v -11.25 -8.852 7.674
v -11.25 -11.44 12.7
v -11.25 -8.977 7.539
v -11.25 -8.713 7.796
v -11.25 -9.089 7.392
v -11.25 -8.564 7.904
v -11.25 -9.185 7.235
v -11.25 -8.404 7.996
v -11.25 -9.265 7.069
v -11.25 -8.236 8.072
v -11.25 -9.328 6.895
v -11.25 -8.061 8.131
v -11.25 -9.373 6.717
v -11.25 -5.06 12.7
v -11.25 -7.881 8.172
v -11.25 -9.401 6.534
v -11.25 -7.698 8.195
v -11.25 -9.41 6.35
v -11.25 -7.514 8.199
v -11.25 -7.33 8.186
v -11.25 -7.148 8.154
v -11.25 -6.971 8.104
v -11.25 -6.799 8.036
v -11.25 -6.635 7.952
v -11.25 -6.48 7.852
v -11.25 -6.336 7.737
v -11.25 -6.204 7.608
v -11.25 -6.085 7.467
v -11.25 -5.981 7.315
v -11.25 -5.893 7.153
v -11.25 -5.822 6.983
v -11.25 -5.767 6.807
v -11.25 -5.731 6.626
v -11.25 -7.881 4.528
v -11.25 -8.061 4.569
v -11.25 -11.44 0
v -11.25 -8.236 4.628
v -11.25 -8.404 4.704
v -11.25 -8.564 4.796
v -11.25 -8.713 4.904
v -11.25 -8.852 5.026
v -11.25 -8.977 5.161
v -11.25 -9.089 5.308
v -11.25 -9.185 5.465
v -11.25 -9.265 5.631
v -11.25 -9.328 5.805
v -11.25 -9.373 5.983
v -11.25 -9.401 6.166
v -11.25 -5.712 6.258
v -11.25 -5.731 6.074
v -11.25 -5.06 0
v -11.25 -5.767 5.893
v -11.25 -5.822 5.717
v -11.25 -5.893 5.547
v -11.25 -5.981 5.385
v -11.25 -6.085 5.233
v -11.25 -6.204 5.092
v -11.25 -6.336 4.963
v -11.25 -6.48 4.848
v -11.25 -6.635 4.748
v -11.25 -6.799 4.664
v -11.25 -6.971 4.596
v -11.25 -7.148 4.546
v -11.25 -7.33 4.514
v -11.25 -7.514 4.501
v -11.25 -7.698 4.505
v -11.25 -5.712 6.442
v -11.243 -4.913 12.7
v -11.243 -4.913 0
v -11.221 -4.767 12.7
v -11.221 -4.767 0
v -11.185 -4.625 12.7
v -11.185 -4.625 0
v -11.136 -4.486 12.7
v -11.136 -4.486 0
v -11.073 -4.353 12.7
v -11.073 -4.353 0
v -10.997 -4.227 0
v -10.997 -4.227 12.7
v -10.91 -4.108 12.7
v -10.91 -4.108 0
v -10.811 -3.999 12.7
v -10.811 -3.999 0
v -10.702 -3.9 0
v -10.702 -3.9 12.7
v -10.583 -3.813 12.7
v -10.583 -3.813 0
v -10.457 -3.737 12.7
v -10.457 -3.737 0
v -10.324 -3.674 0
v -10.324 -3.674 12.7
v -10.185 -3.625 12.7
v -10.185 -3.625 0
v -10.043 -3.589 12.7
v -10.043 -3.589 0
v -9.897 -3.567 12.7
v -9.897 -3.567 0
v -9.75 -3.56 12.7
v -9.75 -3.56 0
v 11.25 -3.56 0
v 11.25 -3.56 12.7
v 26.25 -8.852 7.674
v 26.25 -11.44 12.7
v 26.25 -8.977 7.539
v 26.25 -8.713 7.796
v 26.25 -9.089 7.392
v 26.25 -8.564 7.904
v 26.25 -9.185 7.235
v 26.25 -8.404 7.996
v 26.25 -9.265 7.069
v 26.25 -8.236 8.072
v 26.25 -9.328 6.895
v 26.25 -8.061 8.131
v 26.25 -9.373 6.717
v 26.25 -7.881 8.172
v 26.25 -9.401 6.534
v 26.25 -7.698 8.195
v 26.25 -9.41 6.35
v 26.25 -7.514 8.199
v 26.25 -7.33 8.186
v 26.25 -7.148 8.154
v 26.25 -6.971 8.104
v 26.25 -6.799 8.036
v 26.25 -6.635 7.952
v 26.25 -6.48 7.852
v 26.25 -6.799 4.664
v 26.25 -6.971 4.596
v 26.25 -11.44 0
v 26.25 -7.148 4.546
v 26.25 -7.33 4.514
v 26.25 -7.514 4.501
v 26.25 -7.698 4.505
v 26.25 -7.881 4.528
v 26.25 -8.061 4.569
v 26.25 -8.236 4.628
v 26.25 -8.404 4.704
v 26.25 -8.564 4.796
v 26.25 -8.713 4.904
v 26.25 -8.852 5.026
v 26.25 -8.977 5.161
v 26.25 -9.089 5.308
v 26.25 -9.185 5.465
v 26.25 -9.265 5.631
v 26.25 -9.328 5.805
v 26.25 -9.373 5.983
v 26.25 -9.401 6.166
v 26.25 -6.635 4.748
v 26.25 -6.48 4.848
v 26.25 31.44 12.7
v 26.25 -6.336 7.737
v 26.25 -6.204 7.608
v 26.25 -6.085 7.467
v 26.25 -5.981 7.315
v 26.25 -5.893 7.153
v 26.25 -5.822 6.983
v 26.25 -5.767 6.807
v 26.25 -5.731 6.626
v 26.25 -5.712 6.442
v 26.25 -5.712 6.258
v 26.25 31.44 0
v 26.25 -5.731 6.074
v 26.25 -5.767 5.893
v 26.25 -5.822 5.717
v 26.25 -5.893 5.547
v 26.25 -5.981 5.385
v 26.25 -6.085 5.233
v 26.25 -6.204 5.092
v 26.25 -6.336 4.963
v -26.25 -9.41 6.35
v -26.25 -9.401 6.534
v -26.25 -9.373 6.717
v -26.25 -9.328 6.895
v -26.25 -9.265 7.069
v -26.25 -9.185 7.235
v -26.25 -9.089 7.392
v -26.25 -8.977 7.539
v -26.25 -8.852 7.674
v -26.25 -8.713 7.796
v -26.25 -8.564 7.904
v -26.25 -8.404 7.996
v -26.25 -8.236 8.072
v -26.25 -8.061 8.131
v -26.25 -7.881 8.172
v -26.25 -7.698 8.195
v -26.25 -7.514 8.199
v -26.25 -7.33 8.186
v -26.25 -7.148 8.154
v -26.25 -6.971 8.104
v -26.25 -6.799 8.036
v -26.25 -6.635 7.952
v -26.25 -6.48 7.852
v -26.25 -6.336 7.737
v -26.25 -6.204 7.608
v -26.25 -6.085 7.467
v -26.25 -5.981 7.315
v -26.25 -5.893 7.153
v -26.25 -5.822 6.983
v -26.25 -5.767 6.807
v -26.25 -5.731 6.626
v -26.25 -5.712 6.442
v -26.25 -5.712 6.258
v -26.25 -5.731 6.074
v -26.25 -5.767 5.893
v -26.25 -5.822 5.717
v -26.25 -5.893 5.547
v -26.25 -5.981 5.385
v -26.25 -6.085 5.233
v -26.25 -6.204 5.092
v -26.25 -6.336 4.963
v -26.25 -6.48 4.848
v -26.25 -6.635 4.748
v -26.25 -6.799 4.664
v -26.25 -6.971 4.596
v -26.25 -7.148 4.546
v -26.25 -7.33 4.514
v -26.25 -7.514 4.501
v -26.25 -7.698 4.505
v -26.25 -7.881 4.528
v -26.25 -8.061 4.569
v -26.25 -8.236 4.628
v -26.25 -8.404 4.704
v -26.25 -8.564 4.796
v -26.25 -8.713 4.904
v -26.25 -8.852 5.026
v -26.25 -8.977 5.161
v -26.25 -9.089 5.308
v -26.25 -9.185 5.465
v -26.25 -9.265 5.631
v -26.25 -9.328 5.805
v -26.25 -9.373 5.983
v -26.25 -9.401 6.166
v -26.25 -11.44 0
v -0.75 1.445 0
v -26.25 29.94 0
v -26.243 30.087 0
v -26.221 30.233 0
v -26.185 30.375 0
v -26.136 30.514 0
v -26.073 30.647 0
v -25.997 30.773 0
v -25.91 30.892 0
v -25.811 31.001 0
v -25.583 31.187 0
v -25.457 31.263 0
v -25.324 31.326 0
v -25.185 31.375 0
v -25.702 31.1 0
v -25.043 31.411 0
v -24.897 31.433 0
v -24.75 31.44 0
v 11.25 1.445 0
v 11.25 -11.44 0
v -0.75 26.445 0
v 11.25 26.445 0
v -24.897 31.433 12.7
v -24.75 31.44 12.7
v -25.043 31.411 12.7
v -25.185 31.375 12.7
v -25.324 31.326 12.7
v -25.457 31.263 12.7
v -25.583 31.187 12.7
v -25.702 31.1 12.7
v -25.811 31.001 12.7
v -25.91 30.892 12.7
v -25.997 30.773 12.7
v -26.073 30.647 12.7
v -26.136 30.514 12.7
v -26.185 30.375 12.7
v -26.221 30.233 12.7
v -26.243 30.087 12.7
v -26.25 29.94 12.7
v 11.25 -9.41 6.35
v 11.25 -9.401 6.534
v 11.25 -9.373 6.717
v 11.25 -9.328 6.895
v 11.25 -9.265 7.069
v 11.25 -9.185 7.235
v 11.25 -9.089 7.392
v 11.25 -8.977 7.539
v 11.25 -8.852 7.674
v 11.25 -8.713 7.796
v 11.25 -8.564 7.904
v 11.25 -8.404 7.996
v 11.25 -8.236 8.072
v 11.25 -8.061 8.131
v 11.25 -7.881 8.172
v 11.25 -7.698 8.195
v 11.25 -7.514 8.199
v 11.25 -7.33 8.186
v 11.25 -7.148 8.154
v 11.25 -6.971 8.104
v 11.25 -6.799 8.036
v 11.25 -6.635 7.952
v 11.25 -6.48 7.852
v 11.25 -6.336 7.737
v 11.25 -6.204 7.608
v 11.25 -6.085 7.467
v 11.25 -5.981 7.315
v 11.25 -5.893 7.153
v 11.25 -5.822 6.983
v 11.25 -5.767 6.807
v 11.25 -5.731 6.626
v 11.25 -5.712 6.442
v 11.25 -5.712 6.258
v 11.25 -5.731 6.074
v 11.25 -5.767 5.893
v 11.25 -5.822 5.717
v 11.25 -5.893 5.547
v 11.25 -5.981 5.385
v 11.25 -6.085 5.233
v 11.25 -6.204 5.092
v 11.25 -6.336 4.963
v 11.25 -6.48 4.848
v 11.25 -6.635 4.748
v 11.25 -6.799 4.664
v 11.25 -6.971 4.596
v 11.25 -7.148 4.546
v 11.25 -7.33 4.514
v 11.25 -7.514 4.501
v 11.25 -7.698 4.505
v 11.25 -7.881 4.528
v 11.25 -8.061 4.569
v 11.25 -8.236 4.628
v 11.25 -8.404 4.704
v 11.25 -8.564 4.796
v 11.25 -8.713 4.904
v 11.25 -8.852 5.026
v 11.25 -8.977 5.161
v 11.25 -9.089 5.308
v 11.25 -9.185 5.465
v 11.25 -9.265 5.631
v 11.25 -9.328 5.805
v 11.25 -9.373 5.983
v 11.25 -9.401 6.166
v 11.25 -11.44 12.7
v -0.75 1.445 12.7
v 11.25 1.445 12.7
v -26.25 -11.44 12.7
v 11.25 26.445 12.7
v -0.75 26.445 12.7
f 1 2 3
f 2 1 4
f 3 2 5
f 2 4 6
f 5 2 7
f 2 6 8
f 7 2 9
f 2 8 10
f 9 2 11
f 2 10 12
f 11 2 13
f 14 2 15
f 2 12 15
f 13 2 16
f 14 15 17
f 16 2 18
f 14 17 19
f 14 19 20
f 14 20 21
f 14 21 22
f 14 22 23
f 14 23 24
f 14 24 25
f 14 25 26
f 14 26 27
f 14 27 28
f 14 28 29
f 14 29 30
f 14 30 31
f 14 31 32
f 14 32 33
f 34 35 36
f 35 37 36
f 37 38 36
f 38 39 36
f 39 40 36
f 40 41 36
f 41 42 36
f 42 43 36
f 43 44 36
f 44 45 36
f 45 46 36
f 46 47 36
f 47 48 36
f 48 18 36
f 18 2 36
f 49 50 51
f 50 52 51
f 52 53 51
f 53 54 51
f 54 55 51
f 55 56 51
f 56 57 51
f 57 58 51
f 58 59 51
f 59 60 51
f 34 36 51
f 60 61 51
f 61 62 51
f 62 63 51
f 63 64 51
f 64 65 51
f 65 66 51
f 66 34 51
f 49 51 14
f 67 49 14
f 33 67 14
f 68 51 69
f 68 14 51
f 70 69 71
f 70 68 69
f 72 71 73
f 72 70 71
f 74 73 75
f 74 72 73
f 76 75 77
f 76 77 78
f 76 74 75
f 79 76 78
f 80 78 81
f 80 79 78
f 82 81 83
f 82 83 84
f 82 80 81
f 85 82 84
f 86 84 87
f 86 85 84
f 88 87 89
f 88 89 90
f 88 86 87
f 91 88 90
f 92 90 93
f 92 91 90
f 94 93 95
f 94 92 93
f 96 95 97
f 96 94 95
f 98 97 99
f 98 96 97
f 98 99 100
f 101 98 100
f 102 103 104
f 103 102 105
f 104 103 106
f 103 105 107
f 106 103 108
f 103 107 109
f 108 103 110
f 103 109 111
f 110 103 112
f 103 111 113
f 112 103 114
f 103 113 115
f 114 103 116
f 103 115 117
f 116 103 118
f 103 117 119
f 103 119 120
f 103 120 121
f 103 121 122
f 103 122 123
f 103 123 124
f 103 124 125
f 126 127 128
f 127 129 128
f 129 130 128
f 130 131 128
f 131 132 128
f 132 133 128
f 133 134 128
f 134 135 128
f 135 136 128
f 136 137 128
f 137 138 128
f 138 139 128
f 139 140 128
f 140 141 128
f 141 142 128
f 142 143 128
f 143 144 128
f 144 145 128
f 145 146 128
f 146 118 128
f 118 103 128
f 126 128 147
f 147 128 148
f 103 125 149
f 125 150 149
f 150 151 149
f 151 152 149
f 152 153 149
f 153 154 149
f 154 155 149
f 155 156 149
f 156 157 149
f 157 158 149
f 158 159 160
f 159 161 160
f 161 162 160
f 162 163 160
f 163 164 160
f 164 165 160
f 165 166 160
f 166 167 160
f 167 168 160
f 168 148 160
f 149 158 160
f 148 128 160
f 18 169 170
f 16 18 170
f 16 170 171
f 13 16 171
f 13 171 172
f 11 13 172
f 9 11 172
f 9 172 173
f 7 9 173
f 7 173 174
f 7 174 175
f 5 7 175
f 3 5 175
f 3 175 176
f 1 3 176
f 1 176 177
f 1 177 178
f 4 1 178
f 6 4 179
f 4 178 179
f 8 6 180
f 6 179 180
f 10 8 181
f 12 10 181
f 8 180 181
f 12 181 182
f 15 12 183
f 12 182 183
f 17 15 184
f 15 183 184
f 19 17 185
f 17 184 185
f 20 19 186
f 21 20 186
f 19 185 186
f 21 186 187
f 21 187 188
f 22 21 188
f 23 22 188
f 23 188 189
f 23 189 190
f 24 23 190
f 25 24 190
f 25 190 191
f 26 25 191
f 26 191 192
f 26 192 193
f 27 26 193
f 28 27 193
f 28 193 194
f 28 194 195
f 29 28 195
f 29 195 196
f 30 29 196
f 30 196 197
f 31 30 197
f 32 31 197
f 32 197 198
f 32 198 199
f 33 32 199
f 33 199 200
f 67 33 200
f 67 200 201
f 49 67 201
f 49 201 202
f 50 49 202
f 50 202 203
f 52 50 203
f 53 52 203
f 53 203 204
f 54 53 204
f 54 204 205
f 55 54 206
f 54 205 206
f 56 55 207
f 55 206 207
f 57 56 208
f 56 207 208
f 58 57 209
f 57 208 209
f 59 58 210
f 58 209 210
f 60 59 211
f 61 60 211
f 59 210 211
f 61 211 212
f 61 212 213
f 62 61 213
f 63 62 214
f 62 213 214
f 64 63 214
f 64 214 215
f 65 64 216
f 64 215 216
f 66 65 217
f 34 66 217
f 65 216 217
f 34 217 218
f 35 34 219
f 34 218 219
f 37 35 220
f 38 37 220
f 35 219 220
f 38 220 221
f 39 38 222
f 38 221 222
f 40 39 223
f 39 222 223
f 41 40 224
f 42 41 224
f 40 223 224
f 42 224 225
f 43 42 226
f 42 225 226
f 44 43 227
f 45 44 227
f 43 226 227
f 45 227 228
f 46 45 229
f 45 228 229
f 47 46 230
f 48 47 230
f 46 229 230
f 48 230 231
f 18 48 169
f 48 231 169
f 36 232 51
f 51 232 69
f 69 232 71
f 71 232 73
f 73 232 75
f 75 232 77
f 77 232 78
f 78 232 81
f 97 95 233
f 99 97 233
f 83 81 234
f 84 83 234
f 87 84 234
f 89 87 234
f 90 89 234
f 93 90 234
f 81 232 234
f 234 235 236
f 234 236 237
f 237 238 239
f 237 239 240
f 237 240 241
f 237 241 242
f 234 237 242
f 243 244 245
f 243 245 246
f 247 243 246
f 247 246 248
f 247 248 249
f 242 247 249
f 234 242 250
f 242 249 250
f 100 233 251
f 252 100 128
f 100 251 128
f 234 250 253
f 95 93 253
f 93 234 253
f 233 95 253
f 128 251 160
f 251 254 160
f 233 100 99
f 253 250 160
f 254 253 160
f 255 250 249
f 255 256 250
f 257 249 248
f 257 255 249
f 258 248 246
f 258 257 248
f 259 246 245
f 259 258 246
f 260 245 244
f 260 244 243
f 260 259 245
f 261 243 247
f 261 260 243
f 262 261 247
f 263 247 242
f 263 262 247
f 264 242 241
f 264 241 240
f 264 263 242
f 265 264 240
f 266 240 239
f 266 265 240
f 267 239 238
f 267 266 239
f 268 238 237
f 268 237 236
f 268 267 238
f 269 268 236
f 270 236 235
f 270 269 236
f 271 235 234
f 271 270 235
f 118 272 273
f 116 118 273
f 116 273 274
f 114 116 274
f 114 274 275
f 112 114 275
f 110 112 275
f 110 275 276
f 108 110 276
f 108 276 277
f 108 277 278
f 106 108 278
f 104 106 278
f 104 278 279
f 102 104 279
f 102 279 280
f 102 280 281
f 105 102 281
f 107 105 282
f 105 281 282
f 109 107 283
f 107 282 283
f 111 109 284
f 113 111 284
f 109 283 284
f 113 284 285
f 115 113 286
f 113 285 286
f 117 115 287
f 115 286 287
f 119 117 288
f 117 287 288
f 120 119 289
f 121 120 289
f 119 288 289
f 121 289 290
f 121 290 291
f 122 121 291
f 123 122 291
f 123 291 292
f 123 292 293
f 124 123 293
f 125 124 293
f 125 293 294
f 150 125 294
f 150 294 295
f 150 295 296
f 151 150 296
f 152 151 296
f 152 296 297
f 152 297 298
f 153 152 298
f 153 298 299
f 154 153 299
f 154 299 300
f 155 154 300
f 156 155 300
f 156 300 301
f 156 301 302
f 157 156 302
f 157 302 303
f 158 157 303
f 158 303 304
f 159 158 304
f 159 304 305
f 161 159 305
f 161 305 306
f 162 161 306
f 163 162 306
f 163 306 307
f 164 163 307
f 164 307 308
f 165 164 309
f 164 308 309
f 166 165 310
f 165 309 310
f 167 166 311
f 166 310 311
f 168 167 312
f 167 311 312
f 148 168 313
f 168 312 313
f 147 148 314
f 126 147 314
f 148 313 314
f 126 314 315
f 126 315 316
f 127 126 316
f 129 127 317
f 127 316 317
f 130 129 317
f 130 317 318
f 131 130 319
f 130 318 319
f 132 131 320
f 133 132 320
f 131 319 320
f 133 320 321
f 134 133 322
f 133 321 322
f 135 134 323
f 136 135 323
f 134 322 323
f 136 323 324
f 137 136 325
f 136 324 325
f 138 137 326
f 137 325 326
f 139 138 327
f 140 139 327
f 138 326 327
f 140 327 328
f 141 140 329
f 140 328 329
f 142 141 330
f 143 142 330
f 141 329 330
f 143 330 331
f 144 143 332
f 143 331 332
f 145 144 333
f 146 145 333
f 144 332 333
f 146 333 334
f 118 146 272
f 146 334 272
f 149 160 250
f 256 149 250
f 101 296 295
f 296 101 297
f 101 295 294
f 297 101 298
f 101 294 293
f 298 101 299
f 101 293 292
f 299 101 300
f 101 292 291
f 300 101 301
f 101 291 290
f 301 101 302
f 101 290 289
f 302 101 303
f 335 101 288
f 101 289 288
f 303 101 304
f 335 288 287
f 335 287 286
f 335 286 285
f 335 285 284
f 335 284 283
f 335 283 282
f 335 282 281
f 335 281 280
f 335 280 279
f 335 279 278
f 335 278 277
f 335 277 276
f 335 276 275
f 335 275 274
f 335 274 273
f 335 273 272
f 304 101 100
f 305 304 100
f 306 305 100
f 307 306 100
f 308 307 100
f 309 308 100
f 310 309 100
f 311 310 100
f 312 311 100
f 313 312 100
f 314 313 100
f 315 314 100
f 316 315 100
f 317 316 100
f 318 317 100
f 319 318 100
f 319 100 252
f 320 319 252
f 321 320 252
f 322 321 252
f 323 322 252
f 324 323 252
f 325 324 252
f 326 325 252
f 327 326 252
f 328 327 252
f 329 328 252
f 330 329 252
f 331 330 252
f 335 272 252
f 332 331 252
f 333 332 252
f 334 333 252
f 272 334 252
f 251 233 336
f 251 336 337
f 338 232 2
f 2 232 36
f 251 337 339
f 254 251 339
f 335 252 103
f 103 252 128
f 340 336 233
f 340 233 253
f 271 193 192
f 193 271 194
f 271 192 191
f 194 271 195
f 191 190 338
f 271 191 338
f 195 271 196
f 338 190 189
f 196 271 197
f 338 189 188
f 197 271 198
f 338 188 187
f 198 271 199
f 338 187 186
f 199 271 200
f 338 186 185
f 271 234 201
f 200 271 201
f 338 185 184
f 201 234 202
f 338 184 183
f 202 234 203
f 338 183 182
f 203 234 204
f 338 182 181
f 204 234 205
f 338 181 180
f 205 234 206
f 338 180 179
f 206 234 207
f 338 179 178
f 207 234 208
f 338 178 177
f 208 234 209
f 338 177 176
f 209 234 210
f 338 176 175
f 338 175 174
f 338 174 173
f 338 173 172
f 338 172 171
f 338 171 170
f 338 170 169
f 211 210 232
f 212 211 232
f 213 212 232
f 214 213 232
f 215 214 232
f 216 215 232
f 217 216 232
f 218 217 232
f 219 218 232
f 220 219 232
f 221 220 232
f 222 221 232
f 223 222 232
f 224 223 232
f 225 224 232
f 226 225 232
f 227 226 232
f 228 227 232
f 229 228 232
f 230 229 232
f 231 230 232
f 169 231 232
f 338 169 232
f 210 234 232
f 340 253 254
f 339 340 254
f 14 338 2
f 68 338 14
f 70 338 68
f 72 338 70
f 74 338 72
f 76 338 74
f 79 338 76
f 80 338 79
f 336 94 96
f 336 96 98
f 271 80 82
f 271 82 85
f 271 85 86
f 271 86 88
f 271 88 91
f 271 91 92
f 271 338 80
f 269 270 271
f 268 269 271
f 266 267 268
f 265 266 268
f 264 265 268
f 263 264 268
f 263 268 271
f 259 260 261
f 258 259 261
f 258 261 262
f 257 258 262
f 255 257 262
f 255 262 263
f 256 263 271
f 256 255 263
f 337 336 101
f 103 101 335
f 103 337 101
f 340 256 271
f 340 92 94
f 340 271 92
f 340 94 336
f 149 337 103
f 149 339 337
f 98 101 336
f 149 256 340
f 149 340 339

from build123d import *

# Parameters (mm, degrees)
BOSS_EXTRUDE1_DEPTH = 12.7
FILLET1_R           = 1.5
FILLET2_R           = 1.5
SKETCH4_R           = 1.85
CUT_EXTRUDE1_DEPTH  = 63.498108771
SKETCH11_W          = 12
SKETCH11_H          = 25
CUT_EXTRUDE2_DEPTH  = 12.7


with BuildPart() as part:
    # Sketch1 → Boss-Extrude1 (new body)
    with BuildSketch(Plane.XY):
        Polygon((11.25, -11.44), (26.25, -11.44), (26.25, 31.44), (-26.25, 31.44), (-26.25, -11.44), (-11.25, -11.44), (-11.25, -3.56), (11.25, -3.56), align=None)
    extrude(amount=BOSS_EXTRUDE1_DEPTH)

    # Fillet1
    fillet1_edges = [part.edges().sort_by_distance(p)[0] for p in [
        (-26.25, 31.44, 6.35),
    ]]
    fillet(fillet1_edges, radius=FILLET1_R)

    # Fillet2
    fillet2_edges = [part.edges().sort_by_distance(p)[0] for p in [
        (-11.25, -3.56, 6.35),
    ]]
    fillet(fillet2_edges, radius=FILLET2_R)

    # Sketch4 → Cut-Extrude1 (cut, through all)
    with BuildSketch(Plane.ZY.offset(26.25)):
        with Locations(Location((6.35, -7.56, 0), (0, 0, 270))):
            Circle(SKETCH4_R)
    extrude(amount=-CUT_EXTRUDE1_DEPTH, mode=Mode.SUBTRACT)

    # Sketch11 → Cut-Extrude2 (cut)
    with BuildSketch(Plane.XY.offset(12.7)):
        with Locations((5.25, 13.945)):
            Rectangle(SKETCH11_W, SKETCH11_H)
    extrude(amount=-CUT_EXTRUDE2_DEPTH, mode=Mode.SUBTRACT)


solid = part.part
